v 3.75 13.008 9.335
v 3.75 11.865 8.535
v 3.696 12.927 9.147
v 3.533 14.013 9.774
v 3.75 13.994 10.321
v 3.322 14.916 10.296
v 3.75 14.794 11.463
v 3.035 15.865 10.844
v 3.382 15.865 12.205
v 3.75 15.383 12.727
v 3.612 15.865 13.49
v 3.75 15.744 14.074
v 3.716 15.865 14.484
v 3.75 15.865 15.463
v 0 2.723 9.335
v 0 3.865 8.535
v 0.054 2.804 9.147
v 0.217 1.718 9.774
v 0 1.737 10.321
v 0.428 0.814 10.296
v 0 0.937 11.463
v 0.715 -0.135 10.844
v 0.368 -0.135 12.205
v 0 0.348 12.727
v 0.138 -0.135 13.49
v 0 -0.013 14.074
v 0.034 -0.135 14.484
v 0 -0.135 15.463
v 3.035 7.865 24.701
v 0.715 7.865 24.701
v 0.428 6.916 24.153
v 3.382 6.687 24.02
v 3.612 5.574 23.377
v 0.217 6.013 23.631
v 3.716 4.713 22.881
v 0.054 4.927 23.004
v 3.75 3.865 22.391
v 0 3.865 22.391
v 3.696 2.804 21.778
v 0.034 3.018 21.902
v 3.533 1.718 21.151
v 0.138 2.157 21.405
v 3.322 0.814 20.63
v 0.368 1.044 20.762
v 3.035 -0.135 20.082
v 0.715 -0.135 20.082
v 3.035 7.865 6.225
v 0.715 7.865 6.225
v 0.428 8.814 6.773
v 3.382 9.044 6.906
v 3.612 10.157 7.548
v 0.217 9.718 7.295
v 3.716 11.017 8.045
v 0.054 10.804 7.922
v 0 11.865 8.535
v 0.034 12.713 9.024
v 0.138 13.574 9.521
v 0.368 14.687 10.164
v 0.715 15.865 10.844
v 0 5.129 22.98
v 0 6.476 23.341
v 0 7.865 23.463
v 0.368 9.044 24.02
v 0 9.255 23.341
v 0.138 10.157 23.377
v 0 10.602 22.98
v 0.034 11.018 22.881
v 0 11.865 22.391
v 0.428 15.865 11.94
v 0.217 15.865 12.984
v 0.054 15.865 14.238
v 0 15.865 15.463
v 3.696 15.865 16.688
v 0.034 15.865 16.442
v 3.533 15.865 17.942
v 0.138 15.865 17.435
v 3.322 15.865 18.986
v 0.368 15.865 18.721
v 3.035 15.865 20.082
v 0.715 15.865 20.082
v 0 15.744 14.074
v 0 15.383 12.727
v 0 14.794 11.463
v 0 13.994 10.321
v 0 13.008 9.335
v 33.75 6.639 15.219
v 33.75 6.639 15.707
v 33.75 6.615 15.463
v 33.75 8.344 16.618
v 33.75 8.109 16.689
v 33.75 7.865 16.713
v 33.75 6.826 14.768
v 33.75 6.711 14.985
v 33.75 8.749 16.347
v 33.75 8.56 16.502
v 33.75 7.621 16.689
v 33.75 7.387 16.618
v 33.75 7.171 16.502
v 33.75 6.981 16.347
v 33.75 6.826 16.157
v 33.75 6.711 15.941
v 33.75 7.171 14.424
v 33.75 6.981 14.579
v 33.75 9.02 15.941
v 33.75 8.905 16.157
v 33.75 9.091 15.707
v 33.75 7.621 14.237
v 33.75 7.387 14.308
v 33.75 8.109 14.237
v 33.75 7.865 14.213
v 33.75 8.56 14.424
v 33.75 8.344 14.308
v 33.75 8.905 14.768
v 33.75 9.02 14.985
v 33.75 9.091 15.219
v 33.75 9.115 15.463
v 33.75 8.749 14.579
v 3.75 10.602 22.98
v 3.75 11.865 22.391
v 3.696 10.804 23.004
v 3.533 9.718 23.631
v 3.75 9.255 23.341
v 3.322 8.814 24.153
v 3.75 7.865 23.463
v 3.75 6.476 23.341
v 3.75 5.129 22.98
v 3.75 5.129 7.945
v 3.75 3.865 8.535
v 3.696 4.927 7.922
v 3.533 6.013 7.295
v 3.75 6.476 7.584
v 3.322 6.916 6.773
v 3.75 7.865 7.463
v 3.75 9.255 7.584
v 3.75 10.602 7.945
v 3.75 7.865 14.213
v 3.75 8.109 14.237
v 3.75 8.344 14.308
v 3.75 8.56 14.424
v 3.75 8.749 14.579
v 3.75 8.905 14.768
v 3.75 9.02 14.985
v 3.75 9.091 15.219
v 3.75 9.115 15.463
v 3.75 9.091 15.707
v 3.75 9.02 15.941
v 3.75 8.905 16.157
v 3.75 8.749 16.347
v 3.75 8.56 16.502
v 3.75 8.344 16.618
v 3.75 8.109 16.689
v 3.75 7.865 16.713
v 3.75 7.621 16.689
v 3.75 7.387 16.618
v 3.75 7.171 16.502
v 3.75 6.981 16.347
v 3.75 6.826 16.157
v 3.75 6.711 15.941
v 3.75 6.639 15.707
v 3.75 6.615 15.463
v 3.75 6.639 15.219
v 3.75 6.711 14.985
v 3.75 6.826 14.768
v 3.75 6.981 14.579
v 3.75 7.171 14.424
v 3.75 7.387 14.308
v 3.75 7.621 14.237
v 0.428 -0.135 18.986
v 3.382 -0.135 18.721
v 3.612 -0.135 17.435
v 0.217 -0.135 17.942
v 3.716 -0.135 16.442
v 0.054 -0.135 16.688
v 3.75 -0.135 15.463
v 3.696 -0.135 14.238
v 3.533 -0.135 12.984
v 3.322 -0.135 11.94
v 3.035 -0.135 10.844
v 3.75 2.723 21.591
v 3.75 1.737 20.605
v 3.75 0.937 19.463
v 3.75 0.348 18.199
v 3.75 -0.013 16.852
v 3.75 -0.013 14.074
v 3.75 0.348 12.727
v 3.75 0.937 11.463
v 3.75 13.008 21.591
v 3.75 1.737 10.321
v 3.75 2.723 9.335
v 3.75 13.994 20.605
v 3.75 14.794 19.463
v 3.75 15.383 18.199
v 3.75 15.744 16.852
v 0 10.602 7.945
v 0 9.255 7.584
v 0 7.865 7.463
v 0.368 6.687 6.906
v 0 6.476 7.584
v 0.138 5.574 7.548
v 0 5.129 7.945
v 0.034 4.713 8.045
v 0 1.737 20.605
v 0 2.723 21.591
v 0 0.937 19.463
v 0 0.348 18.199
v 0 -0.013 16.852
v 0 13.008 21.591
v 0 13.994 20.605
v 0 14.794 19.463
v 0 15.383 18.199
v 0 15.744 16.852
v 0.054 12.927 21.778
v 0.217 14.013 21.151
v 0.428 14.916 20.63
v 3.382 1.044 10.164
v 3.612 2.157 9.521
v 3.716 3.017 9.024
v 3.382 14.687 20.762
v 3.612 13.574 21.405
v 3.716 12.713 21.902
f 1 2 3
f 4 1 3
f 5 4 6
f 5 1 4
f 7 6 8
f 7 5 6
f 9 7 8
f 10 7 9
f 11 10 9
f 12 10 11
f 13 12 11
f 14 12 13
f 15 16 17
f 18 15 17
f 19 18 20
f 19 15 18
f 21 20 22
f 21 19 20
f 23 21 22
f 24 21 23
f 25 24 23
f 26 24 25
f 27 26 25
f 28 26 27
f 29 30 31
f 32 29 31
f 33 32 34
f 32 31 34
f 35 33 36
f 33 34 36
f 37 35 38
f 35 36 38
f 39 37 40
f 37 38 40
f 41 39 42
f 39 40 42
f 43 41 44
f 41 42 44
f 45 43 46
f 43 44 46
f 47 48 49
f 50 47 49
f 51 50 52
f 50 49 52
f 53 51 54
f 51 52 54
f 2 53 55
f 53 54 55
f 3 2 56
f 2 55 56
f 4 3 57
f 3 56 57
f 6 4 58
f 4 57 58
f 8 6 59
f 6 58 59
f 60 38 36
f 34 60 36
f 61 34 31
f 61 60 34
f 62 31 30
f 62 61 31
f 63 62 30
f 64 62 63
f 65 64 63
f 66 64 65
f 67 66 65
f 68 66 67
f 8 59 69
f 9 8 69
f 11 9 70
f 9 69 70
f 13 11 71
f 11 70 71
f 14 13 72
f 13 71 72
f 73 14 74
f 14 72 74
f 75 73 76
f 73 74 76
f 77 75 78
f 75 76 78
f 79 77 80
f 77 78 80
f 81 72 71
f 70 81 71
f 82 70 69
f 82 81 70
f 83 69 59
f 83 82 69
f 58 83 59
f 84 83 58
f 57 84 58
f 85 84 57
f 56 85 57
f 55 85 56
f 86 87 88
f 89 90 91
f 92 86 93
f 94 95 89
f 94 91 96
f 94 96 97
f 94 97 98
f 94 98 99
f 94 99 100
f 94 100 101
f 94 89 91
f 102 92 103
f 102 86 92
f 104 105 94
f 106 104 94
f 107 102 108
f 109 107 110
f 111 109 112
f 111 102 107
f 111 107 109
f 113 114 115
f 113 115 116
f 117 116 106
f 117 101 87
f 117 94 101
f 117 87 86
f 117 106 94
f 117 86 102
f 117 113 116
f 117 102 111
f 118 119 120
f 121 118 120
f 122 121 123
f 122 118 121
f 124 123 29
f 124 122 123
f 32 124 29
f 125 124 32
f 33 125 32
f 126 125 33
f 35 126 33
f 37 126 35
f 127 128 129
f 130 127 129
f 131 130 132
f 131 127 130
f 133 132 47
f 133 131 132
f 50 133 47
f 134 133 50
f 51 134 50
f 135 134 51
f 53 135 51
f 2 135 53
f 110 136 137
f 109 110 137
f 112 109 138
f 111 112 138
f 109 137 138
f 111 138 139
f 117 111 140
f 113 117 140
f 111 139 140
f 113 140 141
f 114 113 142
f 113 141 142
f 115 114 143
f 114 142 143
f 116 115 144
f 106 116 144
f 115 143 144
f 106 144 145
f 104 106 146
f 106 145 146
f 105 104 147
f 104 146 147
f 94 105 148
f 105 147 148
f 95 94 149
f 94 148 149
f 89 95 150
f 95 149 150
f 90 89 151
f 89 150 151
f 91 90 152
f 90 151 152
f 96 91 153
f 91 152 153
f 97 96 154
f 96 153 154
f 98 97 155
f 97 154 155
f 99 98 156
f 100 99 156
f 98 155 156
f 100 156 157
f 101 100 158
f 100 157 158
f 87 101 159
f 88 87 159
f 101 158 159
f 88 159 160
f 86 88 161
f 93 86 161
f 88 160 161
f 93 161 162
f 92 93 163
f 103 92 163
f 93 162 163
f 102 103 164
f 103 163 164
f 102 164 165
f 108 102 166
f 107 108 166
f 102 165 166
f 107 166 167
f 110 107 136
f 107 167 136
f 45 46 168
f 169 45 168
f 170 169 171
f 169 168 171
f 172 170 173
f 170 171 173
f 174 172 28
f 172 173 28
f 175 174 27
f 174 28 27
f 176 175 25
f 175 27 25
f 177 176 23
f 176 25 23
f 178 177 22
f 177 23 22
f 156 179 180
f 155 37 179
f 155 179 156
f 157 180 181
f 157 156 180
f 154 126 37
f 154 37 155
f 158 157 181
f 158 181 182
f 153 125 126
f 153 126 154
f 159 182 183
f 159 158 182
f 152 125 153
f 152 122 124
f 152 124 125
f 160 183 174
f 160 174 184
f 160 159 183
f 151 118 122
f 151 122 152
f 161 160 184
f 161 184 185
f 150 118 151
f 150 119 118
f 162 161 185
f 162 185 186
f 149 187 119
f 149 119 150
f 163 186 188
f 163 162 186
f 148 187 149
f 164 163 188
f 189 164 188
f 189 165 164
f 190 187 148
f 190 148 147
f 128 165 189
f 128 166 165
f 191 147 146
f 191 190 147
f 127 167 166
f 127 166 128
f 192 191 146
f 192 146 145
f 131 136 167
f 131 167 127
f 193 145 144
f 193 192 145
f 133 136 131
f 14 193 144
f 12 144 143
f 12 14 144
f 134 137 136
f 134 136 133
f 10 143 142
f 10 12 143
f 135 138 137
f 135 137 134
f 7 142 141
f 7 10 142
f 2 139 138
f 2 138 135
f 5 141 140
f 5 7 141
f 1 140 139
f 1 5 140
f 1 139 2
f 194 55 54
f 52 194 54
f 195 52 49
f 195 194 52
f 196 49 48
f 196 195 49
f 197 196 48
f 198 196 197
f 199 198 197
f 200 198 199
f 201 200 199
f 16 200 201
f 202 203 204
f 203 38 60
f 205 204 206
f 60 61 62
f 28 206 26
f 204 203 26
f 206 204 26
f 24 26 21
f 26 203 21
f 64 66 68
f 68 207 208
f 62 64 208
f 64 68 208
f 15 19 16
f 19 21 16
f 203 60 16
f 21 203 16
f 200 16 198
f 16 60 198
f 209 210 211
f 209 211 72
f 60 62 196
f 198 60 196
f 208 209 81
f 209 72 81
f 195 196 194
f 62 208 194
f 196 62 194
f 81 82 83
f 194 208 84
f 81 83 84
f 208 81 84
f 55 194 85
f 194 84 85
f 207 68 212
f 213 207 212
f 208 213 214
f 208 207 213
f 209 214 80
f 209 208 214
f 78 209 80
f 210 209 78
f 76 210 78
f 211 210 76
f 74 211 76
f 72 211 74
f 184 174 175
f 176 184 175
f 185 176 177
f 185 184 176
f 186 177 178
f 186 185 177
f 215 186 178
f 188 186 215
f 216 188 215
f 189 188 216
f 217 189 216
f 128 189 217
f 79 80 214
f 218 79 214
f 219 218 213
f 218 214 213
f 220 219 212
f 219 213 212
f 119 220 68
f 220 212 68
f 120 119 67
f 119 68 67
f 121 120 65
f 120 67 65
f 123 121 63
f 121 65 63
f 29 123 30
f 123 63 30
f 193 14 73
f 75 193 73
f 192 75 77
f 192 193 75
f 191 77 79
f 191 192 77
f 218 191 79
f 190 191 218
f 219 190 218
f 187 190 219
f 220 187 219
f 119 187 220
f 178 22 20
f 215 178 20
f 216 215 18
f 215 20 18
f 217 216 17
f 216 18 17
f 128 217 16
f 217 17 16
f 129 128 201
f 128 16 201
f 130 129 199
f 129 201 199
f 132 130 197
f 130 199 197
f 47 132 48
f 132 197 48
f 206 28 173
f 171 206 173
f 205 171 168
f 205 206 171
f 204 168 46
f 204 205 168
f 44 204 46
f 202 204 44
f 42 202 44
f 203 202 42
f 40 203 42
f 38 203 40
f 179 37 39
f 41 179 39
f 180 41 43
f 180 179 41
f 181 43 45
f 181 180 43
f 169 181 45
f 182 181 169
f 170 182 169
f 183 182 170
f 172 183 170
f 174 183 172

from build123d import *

# Parameters (mm, degrees)
Y_KSEKLIK_EKSTR_ZYON1_DEPTH = 3.75
IZIM2_R                     = 1.25
Y_KSEKLIK_EKSTR_ZYON2_DEPTH = 30
IZIM3_OUTSIDE_W             = 63.452
IZIM3_OUTSIDE_H             = 60.976
IZIM3_OUTSIDE_R             = 8
KES_EKSTR_ZYON1_DEPTH       = 10
KES_EKSTR_ZYON1_DRAFT       = -60
IZIM4_OUTSIDE_W             = 63.452
IZIM4_OUTSIDE_H             = 60.976
IZIM4_OUTSIDE_R             = 8
KES_EKSTR_ZYON2_DEPTH       = 10
KES_EKSTR_ZYON2_DRAFT       = -60


with BuildPart() as part:
    # Çizim1 → Yükseklik-Ekstrüzyon1 (new body)
    with BuildSketch(Plane(origin=(0, 0, 0), x_dir=(0, 0, -1), z_dir=(1, 0, 0))):
        Polygon((-6.225342033, 7.865351493), (-10.844144187, 15.865351493), (-20.081748494, 15.865351493), (-24.700550647, 7.865351493), (-20.081748494, -0.134648507), (-10.844144187, -0.134648507), align=None)
    extrude(amount=Y_KSEKLIK_EKSTR_ZYON1_DEPTH)

    # Çizim2 → Yükseklik-Ekstrüzyon2 (add)
    with BuildSketch(Plane(origin=(3.75, 0, 0), x_dir=(0, 0, -1), z_dir=(1, 0, 0))):
        with Locations((-15.46294634, 7.865351493)):
            Circle(IZIM2_R)
    extrude(amount=Y_KSEKLIK_EKSTR_ZYON2_DEPTH)


with BuildPart() as kes_ekstr_zyon1_tool:
    # Çizim3 outside → Kes-Ekstrüzyon1 (with draft: the straight prism first)
    with BuildSketch(Plane.ZY):
        with Locations((15.463, 7.865)):
            Rectangle(IZIM3_OUTSIDE_W, IZIM3_OUTSIDE_H)
        with Locations((15.46294634, 7.865351493)):
            Circle(IZIM3_OUTSIDE_R, mode=Mode.SUBTRACT)
    extrude(amount=-KES_EKSTR_ZYON1_DEPTH)
    # Kes-Ekstrüzyon1: the draft: its side faces are tilted about the plane it starts from
    kes_ekstr_zyon1_sides = [kes_ekstr_zyon1_tool.faces().sort_by_distance(p)[0] for p in [
        (5, -22.623, 15.463),
        (5, 7.865, 47.189),
        (5, 38.353, 15.463),
        (5, 7.865, -16.263),
        (5, 7.865351493, 7.46294634),
    ]]
    draft(kes_ekstr_zyon1_sides, Plane.ZY, KES_EKSTR_ZYON1_DRAFT)


with BuildPart() as part_1:
    add(part.part)

    # Kes-Ekstrüzyon1: cut by kes_ekstr_zyon1_tool
    add(kes_ekstr_zyon1_tool.part, mode=Mode.SUBTRACT)


with BuildPart() as kes_ekstr_zyon2_tool:
    # Çizim4 outside → Kes-Ekstrüzyon2 (with draft: the straight prism first)
    with BuildSketch(Plane(origin=(3.75, 0, 0), x_dir=(0, 0, -1), z_dir=(1, 0, 0))):
        with Locations((-15.463, 7.865)):
            Rectangle(IZIM4_OUTSIDE_W, IZIM4_OUTSIDE_H)
        with Locations((-15.46294634, 7.865351493)):
            Circle(IZIM4_OUTSIDE_R, mode=Mode.SUBTRACT)
    extrude(amount=-KES_EKSTR_ZYON2_DEPTH)
    # Kes-Ekstrüzyon2: the draft: its side faces are tilted about the plane it starts from
    kes_ekstr_zyon2_sides = [kes_ekstr_zyon2_tool.faces().sort_by_distance(p)[0] for p in [
        (-1.25, -22.623, 15.463),
        (-1.25, 7.865, -16.263),
        (-1.25, 38.353, 15.463),
        (-1.25, 7.865, 47.189),
        (-1.25, 7.865351493, 23.46294634),
    ]]
    draft(kes_ekstr_zyon2_sides, Plane(origin=(3.75, 0, 0), x_dir=(0, 0, -1), z_dir=(1, 0, 0)), KES_EKSTR_ZYON2_DRAFT)


with BuildPart() as part_2:
    add(part_1.part)

    # Kes-Ekstrüzyon2: cut by kes_ekstr_zyon2_tool
    add(kes_ekstr_zyon2_tool.part, mode=Mode.SUBTRACT)


solid = part_2.part
